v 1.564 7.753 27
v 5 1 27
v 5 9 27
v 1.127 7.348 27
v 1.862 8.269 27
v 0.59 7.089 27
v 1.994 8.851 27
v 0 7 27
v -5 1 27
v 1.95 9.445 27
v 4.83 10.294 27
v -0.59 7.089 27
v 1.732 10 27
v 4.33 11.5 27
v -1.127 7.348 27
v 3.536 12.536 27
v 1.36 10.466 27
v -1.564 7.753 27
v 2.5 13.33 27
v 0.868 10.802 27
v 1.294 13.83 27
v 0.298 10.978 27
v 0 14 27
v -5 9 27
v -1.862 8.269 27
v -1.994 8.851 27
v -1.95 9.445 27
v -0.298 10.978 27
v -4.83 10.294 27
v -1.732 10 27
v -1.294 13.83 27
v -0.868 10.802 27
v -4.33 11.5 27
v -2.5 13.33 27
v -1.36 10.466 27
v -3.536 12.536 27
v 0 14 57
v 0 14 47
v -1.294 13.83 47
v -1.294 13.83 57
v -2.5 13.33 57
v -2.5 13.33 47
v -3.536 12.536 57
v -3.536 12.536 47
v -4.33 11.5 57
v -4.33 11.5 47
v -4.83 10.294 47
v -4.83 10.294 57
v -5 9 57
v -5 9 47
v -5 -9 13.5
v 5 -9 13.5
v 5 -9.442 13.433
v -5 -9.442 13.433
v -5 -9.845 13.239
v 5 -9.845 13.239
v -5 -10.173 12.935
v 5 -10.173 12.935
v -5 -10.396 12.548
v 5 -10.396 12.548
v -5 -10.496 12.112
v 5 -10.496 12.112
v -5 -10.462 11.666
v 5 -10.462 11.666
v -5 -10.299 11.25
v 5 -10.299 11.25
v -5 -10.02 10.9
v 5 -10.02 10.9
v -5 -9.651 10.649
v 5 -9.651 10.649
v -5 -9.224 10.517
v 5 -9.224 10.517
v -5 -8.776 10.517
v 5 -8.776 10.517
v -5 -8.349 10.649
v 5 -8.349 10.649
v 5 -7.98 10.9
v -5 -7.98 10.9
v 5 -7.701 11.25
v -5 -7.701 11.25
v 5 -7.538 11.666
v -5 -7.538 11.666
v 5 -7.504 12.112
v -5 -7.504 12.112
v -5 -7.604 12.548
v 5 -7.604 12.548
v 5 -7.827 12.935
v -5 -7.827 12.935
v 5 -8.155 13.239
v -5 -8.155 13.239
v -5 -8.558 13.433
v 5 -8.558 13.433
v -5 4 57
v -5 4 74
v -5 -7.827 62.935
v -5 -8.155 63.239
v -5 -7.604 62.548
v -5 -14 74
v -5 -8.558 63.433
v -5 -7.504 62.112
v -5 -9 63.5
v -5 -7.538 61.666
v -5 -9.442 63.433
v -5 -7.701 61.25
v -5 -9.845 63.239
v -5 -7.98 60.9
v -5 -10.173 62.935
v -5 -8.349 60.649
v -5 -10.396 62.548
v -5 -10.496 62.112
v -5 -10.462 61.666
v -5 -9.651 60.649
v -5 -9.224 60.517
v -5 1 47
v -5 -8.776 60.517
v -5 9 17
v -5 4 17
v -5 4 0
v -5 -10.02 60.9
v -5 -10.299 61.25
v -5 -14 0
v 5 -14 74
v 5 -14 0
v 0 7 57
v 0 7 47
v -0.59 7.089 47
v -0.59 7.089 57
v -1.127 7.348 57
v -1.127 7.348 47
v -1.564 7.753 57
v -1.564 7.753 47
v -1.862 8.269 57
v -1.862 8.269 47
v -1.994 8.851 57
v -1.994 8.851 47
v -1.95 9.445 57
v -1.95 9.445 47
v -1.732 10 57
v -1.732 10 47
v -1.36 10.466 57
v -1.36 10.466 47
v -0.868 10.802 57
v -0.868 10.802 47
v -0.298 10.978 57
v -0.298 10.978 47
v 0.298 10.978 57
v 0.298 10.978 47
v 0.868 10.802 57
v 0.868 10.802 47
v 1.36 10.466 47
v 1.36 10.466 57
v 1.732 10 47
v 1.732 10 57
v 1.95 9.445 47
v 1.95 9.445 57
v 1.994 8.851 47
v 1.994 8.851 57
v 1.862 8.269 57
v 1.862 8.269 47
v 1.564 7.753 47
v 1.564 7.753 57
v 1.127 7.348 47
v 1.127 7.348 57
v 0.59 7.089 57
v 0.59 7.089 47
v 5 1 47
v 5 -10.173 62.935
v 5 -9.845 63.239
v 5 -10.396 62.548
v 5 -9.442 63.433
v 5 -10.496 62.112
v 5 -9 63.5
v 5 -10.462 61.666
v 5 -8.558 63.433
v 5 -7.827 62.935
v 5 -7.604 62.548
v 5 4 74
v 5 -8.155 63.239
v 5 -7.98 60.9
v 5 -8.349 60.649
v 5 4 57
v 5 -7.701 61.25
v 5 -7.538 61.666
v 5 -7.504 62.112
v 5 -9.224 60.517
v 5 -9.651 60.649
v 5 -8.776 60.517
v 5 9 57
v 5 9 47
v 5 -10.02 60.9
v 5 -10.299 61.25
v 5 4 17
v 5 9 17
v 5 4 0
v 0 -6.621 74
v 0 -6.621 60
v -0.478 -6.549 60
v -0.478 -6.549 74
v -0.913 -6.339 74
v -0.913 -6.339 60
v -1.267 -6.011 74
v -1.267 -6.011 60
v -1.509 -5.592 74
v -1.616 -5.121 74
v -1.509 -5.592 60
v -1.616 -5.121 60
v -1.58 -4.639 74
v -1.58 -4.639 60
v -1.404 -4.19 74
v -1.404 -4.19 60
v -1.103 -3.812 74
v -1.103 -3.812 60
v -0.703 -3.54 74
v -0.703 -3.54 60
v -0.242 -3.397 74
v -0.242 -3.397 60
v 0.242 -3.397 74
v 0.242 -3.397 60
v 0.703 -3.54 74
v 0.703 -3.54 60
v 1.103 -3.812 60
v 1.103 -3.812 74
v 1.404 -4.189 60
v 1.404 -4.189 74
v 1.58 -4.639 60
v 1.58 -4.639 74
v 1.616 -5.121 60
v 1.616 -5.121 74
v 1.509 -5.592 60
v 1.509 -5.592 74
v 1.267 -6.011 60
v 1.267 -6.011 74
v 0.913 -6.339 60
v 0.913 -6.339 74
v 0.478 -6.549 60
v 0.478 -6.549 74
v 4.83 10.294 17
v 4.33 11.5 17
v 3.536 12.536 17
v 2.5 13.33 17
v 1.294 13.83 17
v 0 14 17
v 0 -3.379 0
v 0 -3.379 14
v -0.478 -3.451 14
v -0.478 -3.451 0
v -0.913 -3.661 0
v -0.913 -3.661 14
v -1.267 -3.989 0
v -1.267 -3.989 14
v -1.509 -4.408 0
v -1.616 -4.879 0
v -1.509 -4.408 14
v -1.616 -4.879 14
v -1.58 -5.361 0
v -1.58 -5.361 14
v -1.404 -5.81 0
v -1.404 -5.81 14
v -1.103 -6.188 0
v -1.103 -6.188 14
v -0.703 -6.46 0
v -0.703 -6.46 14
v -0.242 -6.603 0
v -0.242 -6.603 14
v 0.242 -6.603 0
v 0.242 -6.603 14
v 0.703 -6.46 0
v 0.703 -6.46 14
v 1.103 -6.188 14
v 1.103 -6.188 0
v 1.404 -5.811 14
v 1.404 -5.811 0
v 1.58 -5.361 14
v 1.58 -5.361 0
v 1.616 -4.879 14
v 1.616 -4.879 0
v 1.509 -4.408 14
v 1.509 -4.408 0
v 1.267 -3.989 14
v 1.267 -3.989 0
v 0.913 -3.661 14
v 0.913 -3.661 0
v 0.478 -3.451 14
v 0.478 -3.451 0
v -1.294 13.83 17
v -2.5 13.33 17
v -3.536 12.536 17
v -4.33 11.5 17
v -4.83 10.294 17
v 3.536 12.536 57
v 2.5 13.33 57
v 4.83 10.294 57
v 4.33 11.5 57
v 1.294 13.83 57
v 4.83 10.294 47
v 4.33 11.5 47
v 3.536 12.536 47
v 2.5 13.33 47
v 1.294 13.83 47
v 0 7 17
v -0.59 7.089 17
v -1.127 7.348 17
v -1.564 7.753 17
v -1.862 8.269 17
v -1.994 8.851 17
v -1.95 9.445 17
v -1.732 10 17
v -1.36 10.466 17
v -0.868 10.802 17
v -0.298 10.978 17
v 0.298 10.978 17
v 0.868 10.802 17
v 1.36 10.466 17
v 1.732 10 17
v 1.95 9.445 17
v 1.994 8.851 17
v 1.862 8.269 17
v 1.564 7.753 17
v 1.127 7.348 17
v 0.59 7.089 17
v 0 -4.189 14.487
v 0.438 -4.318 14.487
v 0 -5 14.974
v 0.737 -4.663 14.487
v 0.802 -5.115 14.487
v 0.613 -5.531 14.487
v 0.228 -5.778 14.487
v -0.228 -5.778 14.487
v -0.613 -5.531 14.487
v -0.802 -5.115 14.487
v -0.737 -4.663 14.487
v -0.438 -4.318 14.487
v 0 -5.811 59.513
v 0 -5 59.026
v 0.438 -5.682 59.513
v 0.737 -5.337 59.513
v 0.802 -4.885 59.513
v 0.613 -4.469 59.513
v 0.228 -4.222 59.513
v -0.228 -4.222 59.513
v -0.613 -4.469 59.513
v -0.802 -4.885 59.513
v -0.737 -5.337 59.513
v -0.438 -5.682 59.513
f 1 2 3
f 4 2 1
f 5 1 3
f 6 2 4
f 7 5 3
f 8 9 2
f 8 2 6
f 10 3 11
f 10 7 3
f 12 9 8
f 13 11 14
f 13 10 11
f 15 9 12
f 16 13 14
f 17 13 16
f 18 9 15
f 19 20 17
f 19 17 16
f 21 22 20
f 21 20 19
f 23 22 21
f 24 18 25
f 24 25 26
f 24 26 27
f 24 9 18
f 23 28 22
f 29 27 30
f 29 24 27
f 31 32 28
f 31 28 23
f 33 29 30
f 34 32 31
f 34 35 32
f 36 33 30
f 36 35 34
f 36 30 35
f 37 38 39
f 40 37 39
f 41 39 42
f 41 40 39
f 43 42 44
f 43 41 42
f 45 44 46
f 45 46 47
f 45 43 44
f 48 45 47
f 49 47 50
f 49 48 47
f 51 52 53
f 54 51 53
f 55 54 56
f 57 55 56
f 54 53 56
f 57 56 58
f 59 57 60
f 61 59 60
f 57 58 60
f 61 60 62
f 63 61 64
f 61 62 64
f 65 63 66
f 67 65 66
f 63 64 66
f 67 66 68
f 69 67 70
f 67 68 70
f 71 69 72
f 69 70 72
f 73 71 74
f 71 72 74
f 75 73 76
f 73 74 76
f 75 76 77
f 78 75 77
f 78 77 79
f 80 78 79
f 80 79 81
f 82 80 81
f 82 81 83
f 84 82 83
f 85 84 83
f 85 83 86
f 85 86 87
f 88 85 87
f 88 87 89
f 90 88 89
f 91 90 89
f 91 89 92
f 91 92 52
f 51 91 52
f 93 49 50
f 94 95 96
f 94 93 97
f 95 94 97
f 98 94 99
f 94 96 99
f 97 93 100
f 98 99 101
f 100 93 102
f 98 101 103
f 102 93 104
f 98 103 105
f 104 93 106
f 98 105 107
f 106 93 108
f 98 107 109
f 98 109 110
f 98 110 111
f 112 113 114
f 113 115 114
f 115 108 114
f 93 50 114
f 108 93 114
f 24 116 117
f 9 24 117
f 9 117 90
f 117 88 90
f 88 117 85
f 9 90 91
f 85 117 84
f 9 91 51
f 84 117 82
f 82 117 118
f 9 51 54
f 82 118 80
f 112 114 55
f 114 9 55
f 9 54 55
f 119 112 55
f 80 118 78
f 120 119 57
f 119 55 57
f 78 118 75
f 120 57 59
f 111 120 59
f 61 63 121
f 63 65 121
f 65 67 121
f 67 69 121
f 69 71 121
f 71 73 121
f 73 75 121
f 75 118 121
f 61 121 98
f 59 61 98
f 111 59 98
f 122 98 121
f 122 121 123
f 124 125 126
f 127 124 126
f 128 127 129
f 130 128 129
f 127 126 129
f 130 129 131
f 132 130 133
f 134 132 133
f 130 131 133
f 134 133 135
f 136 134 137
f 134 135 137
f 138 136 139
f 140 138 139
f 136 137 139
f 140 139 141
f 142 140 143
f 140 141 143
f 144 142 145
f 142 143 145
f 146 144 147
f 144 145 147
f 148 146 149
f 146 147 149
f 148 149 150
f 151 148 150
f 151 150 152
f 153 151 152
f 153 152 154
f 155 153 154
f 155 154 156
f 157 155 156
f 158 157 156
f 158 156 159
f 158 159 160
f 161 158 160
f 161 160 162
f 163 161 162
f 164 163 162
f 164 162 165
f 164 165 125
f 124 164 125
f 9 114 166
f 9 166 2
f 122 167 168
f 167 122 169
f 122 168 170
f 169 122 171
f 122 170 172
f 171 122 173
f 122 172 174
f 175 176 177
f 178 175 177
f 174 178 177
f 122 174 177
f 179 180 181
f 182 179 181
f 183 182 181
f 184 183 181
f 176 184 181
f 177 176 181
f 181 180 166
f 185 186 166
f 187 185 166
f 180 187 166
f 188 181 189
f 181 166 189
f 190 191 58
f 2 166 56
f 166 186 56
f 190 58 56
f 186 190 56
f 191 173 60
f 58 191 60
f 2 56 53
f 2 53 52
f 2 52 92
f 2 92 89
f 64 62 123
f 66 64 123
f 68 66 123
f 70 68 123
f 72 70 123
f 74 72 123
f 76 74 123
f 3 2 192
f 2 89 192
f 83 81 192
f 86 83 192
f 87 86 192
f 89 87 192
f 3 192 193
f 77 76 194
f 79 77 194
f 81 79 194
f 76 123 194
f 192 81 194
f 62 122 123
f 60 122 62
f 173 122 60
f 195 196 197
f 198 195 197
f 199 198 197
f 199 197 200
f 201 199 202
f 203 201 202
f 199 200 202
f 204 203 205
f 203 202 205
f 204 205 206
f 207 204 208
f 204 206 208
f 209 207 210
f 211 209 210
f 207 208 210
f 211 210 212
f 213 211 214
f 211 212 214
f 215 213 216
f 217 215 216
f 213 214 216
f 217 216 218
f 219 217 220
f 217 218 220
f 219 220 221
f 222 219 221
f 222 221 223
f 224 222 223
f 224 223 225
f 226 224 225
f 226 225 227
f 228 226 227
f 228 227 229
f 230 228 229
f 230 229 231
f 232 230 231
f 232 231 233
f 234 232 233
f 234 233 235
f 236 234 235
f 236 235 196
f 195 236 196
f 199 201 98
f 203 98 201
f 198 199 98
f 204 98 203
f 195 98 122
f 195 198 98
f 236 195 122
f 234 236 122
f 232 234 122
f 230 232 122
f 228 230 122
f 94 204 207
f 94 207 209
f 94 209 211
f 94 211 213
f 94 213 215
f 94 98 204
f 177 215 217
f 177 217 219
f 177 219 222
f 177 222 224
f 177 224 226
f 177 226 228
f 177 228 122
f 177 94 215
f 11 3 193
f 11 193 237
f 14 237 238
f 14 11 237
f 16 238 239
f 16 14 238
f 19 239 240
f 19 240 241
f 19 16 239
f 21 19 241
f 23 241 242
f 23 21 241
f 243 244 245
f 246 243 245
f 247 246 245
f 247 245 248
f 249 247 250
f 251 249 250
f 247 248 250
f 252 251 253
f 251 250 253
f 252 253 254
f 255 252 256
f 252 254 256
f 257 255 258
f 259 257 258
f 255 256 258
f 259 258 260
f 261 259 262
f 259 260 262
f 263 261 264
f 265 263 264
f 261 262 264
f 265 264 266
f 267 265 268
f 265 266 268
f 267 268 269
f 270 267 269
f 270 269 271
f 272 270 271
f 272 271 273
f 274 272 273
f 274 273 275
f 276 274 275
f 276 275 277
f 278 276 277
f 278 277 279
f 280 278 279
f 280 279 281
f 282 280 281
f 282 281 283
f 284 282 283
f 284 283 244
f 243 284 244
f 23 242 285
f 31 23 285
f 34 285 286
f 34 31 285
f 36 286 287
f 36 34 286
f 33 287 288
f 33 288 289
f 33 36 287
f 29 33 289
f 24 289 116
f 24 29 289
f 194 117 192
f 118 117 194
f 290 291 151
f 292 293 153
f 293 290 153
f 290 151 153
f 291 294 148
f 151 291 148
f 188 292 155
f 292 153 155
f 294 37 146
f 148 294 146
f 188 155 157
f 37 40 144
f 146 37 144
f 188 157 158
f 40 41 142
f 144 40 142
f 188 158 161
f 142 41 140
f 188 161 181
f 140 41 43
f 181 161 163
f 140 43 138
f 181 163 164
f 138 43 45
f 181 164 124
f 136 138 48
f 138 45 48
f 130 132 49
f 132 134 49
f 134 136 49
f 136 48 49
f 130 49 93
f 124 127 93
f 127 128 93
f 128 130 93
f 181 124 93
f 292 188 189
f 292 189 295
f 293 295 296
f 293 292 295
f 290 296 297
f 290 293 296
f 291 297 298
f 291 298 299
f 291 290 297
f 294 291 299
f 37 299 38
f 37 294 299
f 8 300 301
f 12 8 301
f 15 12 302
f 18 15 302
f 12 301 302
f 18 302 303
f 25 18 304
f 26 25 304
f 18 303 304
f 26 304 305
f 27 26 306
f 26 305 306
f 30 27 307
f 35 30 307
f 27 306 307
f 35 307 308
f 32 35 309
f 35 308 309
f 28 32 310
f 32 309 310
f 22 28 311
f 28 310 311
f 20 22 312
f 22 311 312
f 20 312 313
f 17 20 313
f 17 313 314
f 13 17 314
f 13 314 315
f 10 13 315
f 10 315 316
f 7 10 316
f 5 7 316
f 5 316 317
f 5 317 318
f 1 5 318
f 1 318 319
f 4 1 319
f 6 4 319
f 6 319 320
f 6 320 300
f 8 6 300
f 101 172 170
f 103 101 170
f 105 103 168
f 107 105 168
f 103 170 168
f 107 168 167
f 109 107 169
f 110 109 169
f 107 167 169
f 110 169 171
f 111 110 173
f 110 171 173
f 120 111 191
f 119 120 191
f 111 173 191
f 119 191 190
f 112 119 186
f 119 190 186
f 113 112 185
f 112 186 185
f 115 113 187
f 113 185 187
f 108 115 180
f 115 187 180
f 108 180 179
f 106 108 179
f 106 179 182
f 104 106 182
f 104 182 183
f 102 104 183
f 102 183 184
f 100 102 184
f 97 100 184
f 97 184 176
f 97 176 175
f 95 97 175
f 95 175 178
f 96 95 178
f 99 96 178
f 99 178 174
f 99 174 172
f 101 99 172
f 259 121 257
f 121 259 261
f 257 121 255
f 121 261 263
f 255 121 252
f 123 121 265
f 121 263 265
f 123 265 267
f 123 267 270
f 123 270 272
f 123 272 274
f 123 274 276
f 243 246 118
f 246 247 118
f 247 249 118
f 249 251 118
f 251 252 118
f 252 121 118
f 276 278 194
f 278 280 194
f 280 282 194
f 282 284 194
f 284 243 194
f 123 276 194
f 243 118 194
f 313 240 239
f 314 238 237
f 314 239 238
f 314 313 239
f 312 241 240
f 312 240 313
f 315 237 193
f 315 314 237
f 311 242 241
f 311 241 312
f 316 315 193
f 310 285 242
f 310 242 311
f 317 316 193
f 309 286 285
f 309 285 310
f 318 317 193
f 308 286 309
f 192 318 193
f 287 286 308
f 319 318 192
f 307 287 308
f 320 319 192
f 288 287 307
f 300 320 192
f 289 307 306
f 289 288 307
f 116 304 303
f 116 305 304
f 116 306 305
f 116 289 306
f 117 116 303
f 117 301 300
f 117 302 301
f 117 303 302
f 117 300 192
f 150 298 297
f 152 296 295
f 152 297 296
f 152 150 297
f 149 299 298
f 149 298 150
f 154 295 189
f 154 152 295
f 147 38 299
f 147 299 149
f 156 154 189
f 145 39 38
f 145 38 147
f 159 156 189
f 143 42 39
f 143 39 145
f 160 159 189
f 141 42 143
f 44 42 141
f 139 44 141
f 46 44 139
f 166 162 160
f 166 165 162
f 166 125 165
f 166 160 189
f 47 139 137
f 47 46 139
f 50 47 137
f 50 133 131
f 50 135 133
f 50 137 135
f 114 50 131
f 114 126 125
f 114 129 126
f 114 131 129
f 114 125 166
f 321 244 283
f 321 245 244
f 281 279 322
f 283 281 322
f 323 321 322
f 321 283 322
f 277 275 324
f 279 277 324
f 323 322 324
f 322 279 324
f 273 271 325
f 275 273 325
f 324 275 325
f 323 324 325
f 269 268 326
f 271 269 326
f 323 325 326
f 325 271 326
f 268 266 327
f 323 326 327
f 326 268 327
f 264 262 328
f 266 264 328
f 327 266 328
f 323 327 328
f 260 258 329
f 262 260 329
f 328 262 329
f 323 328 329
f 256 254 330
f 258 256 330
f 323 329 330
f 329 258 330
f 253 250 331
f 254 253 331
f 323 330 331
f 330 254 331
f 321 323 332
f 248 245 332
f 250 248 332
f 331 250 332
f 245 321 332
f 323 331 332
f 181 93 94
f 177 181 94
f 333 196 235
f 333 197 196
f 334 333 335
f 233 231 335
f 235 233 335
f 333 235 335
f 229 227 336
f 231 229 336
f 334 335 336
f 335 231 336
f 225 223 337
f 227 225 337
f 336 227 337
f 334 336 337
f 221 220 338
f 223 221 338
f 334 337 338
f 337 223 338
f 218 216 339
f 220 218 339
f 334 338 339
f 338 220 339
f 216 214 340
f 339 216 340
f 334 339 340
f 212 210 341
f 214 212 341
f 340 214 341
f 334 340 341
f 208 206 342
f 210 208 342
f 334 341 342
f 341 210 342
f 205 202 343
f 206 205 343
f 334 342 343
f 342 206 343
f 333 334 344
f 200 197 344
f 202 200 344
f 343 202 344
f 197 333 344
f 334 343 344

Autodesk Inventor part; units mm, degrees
ref_plane "YZ Plane" through (0, 0, 0) normal (1, 0, 0) x (0, 1, 0)
ref_plane "XZ Plane" through (0, 0, 0) normal (0, 1, 0) x (-1, 0, 0)
ref_plane "XY Plane" through (0, 0, 0) normal (0, 0, 1) x (1, 0, 0)
sketch "Skizze1" plane through (0, 0, 0) normal (0, 0, 1) x (1, 0, 0)
  line L0 (5, 14) -> (-5, 14)
  line L1 (-5, 14) -> (-5, -14)
  line L2 (-5, -14) -> (5, -14)
  line L3 (5, -14) -> (5, 14)
  line L4 (5, 14) -> (-5, -14) construction
  line L5 (-5, 14) -> (5, -14) construction
  point P0 (0, 0)
  dimension "d0" = 28
  dimension "d1" = 10
extrude "Extrusion1" add sketch "Skizze1" along normal blind 74
sketch "Skizze2" plane through (-5, -14, 0) normal (-1, 0, 0) x (0, 0, 1)
  line L0 (0, 28) -> (74, 28) projected
  line L1 (0, 28) -> (17, 28)
  line L2 (17, 28) -> (17, 18)
  line L3 (17, 18) -> (0, 18)
  line L4 (0, 18) -> (0, 28)
  line L5 (74, 28) -> (57, 28)
  line L6 (57, 28) -> (57, 18)
  line L7 (57, 18) -> (74, 18)
  line L8 (74, 18) -> (74, 28)
  line L9 (27, 28) -> (47, 28)
  line L10 (47, 28) -> (47, 15)
  line L11 (47, 15) -> (27, 15)
  line L12 (27, 15) -> (27, 28)
  line L13 (0, 0) -> (74, 0) projected
  point P0 (0, 14)
  dimension "d4" = 15
  dimension "d5" = 20
  dimension "d6" = 40
  dimension "d7" = 10
  dimension "d8" = 18
  dimension "d9" = 18
extrude "Extrusion2" cut sketch "Skizze2" against normal blind 74
sketch "Skizze3" plane through (-5, 4, 57) normal (0, 0, 1) x (1, 0, 0)
  line L0 (10, 10) -> (10, 0) projected
  line L1 (10, 0) -> (0, 0) projected
  point P0 (5, -4)
  point P1 (5, 5)
  dimension "d12" = 5
  dimension "d13" = 5
hole "Bohrung1" at (0, 9, 57) direction (0, 0, -1) diameter 4 end through all
fillet "Rundung1" radius 5 4 edges at (-5, 14, 22) (-5, 14, 52) (5, 14, 52) (5, 14, 22)
sketch "Skizze4" plane through (-5, -14, 0) normal (-1, 0, 0) x (0, 0, 1)
  line L0 (0, 18) -> (0, 0) projected
  line L1 (74, 18) -> (74, 0) projected
  line L2 (74, 18) -> (57, 18) projected
  point P0 (0, 14)
  point P1 (12, 5)
  point P2 (62, 5)
  dimension "d22" = 50
  dimension "d23" = 12
  dimension "d24" = 12
  dimension "d25" = 13
hole "Bohrung2" at (-5, -9, 12) at (-5, -9, 62) direction (1, 0, 0) diameter 3 end through all
sketch "Skizze5" plane through (0, 0, 74) normal (0, 0, 1) x (1, 0, 0)
  line L0 (-5, -14) -> (5, -14) projected
  line L1 (-5, 4) -> (-5, -14) projected
  point P0 (0, 0)
  point P1 (0, -5)
  dimension "d33" = 9
  dimension "d34" = 5
hole "Bohrung3" at (0, -5, 74) direction (0, 0, -1) diameter 3.242 depth 14 tip angle 118 thread size "M4x0.7" class "6H" standard "ISO Metric profile"
sketch "Skizze6" plane through (0, 0, 0) normal (0, 0, -1) x (-1, 0, 0)
  line L0 (5, 4) -> (5, -14) projected
  line L1 (5, -14) -> (-5, -14) projected
  point P0 (0, 0)
  point P1 (0, -5)
  dimension "d42" = 5
  dimension "d43" = 9
hole "Bohrung4" at (0, -5, 0) direction (0, 0, 1) diameter 3.242 depth 14 tip angle 118 thread size "M4x0.7" class "6H" standard "ISO Metric profile"
properties part number "ABI_Lagerbock"
